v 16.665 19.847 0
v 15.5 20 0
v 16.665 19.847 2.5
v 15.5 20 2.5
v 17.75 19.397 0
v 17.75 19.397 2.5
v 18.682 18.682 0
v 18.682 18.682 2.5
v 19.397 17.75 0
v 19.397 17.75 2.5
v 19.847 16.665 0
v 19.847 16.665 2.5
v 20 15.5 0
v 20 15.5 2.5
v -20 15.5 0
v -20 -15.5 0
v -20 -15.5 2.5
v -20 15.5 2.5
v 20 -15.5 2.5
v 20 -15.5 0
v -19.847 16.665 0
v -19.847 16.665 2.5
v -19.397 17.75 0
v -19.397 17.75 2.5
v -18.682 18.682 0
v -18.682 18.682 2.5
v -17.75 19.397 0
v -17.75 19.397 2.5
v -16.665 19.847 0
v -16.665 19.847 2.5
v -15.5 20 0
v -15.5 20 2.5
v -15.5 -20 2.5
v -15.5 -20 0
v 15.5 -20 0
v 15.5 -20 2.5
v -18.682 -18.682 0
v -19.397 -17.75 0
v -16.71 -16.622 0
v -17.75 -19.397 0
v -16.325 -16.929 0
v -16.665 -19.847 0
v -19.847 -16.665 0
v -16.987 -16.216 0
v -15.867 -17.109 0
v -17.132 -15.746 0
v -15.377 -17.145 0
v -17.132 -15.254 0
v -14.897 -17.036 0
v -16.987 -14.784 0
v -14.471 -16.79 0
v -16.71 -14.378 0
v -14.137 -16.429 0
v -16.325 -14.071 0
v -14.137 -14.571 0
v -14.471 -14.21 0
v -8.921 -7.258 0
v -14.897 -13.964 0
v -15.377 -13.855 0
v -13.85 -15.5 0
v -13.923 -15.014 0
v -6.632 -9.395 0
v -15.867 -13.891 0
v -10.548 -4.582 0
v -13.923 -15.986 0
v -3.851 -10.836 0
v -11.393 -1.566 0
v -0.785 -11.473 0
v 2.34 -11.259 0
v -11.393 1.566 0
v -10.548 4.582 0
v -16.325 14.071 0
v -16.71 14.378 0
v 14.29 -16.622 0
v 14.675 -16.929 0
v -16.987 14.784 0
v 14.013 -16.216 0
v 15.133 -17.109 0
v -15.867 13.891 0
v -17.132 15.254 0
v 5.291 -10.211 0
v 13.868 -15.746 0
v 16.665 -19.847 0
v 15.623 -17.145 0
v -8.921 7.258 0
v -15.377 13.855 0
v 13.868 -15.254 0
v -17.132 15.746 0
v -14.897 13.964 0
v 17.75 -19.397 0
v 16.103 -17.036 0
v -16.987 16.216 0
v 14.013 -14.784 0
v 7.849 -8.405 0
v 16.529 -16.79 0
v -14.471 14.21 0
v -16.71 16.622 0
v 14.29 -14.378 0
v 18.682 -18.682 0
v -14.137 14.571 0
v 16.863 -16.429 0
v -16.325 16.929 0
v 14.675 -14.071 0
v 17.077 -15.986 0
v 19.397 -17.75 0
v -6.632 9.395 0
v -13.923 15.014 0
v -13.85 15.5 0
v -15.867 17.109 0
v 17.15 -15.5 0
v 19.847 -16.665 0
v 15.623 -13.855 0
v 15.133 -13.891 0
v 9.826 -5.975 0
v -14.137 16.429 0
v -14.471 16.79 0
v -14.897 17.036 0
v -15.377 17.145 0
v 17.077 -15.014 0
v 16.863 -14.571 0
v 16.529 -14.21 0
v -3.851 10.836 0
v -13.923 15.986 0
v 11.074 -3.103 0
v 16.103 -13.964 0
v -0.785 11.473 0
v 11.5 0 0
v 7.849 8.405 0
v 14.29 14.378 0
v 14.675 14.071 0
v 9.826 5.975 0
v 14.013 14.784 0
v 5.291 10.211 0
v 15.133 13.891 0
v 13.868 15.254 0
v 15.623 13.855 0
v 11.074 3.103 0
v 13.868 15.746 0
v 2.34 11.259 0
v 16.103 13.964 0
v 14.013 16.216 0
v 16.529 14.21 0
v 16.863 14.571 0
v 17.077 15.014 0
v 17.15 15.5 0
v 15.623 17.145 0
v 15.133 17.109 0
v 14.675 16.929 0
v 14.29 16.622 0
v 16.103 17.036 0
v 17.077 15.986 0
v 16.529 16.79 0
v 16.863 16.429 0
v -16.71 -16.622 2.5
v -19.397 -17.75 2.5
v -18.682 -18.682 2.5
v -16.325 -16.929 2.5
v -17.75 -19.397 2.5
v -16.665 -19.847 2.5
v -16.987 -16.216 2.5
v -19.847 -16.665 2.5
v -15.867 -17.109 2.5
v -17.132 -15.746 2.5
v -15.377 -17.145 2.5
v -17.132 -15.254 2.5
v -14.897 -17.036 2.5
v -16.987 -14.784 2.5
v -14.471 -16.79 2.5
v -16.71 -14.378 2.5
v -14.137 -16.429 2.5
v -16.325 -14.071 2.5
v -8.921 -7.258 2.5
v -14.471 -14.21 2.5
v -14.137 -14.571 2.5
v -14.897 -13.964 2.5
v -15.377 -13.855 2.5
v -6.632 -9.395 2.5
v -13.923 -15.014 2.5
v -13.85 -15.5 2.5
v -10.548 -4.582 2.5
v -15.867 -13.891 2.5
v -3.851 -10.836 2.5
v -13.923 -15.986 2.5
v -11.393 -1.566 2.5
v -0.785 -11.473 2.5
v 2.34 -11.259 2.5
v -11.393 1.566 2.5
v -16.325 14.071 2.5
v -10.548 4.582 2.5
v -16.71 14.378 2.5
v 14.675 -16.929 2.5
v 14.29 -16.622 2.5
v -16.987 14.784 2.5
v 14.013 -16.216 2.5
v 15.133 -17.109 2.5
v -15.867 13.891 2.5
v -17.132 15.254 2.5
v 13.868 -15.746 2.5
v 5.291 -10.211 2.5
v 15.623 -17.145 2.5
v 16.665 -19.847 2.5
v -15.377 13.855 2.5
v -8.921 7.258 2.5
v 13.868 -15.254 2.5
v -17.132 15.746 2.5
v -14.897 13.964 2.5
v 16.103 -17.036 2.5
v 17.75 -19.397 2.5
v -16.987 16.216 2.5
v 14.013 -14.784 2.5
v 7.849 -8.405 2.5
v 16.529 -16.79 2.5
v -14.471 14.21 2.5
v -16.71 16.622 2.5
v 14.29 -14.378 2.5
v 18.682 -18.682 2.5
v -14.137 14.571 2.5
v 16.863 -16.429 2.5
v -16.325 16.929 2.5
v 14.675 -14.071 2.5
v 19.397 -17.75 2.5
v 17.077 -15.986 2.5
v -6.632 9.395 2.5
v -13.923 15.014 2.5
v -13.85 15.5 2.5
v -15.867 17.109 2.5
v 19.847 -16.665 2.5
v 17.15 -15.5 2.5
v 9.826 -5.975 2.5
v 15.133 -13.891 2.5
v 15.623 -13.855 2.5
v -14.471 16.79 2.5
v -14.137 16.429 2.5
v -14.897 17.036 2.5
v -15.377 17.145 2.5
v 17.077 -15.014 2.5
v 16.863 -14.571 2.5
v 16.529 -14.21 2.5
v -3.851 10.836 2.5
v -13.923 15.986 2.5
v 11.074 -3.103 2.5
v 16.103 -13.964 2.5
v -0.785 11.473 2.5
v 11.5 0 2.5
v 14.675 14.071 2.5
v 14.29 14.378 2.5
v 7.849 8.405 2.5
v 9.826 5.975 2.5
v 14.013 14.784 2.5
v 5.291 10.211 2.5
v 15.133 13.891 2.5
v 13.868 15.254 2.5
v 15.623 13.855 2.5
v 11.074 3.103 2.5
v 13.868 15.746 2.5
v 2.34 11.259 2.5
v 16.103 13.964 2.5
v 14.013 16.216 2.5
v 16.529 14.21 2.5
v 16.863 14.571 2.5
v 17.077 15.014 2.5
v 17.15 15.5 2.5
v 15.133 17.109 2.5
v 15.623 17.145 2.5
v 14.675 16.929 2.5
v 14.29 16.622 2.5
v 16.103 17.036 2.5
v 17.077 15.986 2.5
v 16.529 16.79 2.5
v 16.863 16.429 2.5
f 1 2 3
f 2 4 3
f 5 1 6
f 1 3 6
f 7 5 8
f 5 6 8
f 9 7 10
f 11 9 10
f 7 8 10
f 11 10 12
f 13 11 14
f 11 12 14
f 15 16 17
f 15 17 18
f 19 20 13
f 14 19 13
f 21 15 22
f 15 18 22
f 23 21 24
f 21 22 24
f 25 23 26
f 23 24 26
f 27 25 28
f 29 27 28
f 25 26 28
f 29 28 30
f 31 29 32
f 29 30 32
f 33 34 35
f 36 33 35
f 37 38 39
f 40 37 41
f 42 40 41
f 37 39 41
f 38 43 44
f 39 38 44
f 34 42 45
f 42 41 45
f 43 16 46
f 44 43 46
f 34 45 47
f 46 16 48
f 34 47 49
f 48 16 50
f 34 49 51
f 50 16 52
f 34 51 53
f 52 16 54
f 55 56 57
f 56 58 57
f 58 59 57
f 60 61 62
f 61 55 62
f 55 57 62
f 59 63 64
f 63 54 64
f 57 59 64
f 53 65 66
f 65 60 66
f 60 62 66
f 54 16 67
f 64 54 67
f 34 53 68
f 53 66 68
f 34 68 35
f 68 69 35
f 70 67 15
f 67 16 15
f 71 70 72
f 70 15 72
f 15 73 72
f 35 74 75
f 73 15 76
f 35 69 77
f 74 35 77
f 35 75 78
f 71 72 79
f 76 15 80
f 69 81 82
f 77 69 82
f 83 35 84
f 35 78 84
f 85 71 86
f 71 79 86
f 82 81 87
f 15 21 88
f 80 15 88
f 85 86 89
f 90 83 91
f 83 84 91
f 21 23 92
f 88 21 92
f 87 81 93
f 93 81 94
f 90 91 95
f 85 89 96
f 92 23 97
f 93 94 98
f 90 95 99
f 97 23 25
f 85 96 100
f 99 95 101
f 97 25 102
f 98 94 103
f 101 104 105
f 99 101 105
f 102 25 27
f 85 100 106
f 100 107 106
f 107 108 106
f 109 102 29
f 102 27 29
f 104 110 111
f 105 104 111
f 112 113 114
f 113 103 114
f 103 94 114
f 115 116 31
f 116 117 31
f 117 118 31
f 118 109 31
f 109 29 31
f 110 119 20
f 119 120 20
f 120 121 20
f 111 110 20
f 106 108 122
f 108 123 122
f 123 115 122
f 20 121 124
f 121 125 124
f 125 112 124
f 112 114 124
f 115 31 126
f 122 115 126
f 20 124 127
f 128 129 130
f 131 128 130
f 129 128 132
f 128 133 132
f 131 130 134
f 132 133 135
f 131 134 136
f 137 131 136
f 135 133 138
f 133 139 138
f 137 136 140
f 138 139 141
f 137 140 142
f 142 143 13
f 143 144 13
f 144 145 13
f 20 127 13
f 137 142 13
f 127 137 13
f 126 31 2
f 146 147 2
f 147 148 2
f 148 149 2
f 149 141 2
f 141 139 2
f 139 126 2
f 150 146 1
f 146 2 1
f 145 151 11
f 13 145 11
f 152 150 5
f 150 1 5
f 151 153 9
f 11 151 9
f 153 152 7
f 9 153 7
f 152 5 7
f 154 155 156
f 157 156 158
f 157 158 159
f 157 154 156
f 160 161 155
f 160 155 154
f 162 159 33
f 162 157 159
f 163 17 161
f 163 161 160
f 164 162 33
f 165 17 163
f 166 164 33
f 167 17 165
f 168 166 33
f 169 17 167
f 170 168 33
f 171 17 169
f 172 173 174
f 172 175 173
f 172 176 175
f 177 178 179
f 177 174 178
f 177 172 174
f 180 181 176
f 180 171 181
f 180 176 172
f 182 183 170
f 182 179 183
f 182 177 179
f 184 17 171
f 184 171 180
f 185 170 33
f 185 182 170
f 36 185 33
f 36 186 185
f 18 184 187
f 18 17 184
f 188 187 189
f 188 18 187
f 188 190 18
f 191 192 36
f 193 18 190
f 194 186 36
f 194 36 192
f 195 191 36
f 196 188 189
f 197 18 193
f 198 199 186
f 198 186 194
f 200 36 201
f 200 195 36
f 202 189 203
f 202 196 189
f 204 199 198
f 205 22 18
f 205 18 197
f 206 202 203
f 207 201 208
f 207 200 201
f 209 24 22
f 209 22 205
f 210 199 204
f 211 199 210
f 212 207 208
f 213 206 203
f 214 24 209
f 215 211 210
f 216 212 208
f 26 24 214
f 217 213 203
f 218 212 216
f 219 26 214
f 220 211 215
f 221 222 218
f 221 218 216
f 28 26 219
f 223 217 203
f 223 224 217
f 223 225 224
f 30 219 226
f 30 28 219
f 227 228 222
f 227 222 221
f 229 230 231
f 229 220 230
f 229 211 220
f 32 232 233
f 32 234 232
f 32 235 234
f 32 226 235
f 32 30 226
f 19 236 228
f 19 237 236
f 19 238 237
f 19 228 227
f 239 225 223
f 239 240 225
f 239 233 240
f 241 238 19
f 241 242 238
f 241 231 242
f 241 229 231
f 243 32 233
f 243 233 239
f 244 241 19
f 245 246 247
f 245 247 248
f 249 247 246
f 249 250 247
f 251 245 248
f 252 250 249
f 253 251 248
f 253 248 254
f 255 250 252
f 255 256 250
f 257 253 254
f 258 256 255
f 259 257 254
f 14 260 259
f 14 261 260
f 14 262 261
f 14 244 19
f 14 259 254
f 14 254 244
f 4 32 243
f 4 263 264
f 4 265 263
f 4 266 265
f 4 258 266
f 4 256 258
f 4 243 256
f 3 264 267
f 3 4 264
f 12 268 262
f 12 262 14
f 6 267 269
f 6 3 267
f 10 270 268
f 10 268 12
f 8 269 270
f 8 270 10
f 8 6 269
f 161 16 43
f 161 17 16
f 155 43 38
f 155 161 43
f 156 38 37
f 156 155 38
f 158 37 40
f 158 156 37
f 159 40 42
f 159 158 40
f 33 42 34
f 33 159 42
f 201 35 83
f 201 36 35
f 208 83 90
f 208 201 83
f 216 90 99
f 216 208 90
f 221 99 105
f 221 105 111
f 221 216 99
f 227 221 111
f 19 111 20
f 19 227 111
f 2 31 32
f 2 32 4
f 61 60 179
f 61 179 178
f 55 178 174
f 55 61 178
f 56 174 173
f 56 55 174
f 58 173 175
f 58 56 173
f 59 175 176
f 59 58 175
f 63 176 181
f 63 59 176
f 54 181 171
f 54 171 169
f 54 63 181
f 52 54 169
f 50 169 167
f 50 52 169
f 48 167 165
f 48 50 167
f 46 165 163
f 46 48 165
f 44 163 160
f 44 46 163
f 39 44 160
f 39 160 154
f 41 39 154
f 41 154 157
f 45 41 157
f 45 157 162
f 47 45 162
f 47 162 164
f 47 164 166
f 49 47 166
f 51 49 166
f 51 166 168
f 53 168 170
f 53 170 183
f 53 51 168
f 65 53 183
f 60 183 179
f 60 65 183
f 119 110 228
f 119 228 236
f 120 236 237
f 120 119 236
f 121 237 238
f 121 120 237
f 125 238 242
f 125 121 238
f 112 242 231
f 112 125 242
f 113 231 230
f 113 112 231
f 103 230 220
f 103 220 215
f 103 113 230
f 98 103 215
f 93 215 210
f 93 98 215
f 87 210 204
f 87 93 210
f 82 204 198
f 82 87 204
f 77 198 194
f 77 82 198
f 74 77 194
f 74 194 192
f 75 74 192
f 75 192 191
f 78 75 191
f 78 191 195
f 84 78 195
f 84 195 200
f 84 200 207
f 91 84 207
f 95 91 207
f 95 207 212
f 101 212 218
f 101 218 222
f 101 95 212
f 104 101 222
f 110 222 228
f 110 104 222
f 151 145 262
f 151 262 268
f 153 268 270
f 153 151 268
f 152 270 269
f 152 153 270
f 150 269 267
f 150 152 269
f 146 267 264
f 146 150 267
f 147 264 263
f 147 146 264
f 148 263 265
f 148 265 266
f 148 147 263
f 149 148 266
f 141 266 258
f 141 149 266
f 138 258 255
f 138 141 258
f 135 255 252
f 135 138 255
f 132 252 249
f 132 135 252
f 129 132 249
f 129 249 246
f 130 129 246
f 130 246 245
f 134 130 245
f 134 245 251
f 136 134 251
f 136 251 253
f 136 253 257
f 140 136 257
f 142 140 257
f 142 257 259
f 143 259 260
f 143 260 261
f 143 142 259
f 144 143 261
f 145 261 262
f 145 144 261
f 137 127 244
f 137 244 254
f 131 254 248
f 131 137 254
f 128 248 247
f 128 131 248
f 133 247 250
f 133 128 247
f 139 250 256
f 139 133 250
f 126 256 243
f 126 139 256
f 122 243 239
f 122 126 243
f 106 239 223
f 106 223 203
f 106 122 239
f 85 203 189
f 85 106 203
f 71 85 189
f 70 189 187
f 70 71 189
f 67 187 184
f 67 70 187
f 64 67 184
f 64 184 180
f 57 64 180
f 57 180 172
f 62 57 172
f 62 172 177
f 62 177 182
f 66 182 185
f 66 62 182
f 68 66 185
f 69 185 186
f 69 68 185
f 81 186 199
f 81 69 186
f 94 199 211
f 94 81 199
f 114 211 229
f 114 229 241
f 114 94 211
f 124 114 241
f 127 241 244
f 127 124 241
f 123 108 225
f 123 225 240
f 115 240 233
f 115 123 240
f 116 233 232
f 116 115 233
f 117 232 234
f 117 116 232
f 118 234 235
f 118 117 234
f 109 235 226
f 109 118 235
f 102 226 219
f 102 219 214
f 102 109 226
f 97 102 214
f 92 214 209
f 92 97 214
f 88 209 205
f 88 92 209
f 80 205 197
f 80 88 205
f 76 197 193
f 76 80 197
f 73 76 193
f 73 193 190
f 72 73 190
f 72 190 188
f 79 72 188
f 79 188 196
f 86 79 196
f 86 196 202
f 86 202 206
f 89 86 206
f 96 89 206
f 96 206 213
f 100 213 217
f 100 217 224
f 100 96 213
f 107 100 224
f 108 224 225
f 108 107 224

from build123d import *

# Parameters (mm, degrees)
SKETCH_W   = 40
SKETCH_H   = 40
SKETCH_R   = 1.65
SKETCH_R_2 = 11.5
PAD_DEPTH  = 2.5
FILLET_R   = 4.5


with BuildPart() as part:
    # Sketch → Pad (new body)
    with BuildSketch(Plane.XY):
        Rectangle(SKETCH_W, SKETCH_H)
        with Locations((-15.5, 15.5)):
            Circle(SKETCH_R, mode=Mode.SUBTRACT)
        with Locations((15.5, 15.5)):
            Circle(SKETCH_R, mode=Mode.SUBTRACT)
        with Locations((15.5, -15.5)):
            Circle(SKETCH_R, mode=Mode.SUBTRACT)
        with Locations((-15.5, -15.5)):
            Circle(SKETCH_R, mode=Mode.SUBTRACT)
        Circle(SKETCH_R_2, mode=Mode.SUBTRACT)
    extrude(amount=PAD_DEPTH)

    # Fillet
    fillet_edges = [part.edges().sort_by_distance(p)[0] for p in [
        (-20, -20, 1.25),
        (-20, 20, 1.25),
        (20, 20, 1.25),
        (20, -20, 1.25),
    ]]
    fillet(fillet_edges, radius=FILLET_R)


solid = part.part
